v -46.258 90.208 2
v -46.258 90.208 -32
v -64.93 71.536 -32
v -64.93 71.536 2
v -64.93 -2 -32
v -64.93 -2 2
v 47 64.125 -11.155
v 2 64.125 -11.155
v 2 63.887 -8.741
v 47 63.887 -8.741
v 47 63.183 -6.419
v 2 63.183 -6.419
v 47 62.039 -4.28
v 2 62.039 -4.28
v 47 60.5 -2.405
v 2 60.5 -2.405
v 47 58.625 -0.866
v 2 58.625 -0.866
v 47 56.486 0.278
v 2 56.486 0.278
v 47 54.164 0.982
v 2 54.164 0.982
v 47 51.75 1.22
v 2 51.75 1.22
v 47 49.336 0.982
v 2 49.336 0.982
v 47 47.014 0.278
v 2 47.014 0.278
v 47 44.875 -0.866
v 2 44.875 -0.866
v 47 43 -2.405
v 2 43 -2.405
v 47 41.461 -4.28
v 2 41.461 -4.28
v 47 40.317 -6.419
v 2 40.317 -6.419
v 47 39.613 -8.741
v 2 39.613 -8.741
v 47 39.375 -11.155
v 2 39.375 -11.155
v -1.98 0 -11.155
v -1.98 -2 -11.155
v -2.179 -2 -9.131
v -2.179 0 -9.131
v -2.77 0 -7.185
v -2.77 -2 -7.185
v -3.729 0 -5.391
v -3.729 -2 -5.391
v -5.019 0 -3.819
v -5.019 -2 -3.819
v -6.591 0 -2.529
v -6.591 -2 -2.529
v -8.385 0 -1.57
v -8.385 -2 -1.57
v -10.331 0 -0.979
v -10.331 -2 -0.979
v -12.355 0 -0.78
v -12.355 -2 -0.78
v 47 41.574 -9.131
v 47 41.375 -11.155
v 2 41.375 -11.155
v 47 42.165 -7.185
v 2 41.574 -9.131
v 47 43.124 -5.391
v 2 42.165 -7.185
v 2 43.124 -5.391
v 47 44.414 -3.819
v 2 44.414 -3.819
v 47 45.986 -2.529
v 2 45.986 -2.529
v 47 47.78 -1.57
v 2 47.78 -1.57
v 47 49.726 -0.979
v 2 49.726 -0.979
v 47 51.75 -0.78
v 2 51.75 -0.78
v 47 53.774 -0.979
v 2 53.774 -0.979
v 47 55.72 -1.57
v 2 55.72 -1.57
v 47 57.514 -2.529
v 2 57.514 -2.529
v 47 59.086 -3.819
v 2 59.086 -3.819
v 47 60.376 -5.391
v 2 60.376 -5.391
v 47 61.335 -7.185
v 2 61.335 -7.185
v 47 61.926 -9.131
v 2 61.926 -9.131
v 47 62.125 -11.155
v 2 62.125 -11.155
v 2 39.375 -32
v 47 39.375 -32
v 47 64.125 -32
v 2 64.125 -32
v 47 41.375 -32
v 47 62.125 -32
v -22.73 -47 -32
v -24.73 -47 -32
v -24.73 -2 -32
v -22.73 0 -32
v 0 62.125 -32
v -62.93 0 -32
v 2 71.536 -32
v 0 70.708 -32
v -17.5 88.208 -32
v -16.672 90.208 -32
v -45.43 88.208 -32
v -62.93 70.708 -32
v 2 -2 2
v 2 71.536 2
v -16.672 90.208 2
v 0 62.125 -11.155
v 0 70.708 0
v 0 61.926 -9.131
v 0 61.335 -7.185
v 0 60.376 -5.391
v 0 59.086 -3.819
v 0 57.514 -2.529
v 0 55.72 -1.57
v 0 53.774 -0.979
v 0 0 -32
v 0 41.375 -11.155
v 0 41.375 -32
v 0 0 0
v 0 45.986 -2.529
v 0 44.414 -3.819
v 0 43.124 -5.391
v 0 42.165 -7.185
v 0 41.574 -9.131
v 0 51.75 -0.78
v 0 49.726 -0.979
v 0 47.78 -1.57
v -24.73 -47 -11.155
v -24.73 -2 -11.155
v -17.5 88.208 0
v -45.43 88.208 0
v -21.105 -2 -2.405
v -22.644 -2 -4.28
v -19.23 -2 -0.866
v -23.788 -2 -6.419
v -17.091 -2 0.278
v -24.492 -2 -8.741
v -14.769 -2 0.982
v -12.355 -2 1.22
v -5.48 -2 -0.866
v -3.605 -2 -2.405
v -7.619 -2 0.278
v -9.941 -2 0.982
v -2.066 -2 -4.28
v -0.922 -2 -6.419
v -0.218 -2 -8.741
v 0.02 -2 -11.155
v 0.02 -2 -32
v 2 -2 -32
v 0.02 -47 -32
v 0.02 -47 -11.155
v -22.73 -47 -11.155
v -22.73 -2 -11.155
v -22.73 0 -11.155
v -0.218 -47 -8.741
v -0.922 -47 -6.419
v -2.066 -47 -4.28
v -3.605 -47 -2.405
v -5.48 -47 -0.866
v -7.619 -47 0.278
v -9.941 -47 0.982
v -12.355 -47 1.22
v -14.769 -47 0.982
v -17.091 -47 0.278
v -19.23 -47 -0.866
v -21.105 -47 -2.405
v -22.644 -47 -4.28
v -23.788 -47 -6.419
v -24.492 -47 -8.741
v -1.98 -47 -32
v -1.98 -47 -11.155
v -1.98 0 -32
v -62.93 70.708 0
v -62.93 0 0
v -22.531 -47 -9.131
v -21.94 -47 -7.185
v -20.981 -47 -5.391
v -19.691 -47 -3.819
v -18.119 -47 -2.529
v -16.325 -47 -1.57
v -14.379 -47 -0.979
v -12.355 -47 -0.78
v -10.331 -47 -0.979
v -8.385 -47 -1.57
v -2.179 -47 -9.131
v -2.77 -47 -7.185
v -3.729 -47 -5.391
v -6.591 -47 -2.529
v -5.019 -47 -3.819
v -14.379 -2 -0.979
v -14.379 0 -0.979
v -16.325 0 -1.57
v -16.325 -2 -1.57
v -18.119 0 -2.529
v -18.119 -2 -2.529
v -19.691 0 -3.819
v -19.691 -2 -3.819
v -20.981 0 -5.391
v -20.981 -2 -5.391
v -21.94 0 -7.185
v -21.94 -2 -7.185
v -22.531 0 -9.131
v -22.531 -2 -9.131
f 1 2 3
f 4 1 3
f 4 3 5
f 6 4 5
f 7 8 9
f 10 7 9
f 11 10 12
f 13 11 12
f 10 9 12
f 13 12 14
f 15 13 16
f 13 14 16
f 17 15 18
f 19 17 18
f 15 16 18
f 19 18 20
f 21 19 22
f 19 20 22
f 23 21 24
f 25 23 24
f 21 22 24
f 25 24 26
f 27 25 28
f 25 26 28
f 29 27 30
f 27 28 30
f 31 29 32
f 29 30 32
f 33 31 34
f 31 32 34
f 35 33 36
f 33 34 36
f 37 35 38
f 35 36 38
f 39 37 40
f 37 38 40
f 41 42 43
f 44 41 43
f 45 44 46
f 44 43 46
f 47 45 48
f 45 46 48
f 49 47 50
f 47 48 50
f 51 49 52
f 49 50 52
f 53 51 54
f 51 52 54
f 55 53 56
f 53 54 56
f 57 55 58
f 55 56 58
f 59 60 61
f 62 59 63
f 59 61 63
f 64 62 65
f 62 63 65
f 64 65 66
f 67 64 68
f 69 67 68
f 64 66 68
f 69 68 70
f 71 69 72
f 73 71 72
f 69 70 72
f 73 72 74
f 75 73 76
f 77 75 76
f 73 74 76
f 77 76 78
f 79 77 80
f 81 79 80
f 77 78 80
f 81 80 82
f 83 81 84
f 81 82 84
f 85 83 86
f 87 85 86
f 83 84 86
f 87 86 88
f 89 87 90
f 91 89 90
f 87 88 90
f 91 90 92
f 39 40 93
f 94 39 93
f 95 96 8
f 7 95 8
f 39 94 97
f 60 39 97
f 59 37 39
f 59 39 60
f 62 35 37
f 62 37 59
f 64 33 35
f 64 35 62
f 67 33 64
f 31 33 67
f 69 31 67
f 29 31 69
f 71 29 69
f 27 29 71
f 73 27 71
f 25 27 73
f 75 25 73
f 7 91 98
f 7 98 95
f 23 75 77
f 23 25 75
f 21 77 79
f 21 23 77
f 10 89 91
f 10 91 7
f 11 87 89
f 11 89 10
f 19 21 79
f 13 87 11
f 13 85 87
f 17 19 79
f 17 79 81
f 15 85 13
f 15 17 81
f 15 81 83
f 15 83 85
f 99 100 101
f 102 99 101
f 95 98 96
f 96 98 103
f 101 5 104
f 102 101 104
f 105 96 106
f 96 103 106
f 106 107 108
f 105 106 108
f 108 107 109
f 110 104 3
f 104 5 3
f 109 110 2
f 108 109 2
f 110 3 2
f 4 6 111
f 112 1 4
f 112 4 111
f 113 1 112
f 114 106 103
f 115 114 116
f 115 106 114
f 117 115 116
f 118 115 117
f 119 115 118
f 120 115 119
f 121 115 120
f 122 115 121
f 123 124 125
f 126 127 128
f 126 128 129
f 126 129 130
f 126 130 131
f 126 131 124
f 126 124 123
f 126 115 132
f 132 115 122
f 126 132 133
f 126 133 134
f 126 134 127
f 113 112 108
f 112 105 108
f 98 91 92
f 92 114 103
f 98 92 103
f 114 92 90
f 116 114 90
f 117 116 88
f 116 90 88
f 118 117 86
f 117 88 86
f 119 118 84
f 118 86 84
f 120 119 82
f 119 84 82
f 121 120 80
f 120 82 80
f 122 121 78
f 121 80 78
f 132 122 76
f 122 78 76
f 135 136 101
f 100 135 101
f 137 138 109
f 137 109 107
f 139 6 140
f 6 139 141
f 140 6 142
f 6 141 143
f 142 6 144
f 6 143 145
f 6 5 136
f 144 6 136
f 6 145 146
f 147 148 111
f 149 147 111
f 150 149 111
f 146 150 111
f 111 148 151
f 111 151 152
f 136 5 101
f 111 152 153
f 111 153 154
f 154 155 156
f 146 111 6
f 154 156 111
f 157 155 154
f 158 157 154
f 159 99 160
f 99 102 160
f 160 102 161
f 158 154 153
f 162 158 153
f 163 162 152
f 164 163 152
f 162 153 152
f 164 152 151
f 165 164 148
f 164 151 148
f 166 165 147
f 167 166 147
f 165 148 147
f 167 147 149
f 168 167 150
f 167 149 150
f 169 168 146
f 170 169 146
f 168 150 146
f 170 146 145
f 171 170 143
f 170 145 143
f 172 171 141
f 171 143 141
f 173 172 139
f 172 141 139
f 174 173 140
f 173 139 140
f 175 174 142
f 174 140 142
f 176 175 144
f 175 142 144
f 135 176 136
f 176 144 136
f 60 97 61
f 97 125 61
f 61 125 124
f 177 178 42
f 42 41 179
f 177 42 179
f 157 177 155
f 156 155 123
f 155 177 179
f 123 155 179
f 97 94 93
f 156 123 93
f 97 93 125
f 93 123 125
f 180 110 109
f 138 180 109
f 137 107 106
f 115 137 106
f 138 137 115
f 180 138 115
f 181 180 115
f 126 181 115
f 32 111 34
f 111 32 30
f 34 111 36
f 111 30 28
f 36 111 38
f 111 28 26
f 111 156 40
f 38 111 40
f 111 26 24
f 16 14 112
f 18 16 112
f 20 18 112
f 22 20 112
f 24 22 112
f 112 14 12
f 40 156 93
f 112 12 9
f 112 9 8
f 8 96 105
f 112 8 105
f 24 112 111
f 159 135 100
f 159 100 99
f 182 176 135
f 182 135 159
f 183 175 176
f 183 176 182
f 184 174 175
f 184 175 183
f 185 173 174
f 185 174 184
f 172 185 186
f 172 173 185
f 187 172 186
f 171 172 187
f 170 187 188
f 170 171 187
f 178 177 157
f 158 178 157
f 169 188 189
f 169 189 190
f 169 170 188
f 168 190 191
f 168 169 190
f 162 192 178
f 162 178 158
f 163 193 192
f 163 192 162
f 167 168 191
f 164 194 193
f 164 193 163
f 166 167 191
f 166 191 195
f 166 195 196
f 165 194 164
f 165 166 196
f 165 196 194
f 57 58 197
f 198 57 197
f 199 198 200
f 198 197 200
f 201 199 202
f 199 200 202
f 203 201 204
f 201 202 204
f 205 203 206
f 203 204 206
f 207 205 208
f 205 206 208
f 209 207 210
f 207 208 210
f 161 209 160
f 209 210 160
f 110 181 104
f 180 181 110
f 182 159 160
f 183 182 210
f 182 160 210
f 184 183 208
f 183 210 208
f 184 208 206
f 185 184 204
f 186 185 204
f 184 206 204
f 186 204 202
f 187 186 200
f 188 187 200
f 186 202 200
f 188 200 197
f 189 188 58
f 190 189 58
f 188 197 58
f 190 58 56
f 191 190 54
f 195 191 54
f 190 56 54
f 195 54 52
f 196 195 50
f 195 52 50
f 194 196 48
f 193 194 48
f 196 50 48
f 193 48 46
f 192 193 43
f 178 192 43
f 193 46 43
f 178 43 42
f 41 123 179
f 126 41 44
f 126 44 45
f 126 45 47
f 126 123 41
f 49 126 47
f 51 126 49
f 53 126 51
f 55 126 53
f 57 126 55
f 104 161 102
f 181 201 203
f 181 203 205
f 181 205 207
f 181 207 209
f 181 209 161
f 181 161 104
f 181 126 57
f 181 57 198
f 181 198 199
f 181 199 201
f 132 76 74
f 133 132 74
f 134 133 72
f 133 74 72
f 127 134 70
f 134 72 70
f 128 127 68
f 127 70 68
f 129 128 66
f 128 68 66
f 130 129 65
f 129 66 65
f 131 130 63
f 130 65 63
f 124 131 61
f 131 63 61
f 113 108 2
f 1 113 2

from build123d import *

# Parameters (mm, degrees)
F1_DEPTH  = 32
F3_DEPTH  = 2
F5_DEPTH  = 2
F7_DEPTH  = 2
F9_DEPTH  = 45
F11_DEPTH = 45


with BuildPart() as f1:
    # F0 (on Top) → F1 (new body)
    with BuildSketch(Plane.XY):
        Polygon((2, 71.536247), (-16.671573, 90.20782), (-46.258427, 90.20782), (-64.93, 71.536247), (-64.93, -2), (2, -2), align=None)
        Polygon((0, 70.70782), (0, 0), (-62.93, 0), (-62.93, 70.70782), (-45.43, 88.20782), (-17.5, 88.20782), align=None, mode=Mode.SUBTRACT)
    extrude(amount=-F1_DEPTH)

    # F2 (on face) → F3 (join)
    with BuildSketch(Plane.XY):
        Polygon((-64.93, 71.536247), (-64.93, -2), (2, -2), (2, 71.536247), (-16.671573, 90.20782), (-46.258427, 90.20782), align=None)
    extrude(amount=F3_DEPTH)

    # F4 (on face) → F5 (cut)
    with BuildSketch(Plane.XZ.offset(2)):
        with BuildLine():
            ThreePointArc((-12.355, -0.78), (-19.691233, -3.818767), (-22.73, -11.155))
            Line((-22.73, -11.155), (-22.73, -32))
            Line((-22.73, -32), (-1.98, -32))
            Line((-1.98, -32), (-1.98, -11.155))
            ThreePointArc((-1.98, -11.155), (-5.018767, -3.818767), (-12.355, -0.78))
        make_face()
    extrude(amount=-F5_DEPTH, mode=Mode.SUBTRACT)

    # F6 (on face) → F7 (cut)
    with BuildSketch(Plane.YZ.offset(2)):
        with BuildLine():
            Line((62.125, -32), (62.125, -11.155))
            ThreePointArc((62.125, -11.155), (59.086233, -3.818767), (51.75, -0.78))
            ThreePointArc((51.75, -0.78), (44.413767, -3.818767), (41.375, -11.155))
            Line((41.375, -11.155), (41.375, -32))
            Line((41.375, -32), (62.125, -32))
        make_face()
    extrude(amount=-F7_DEPTH, mode=Mode.SUBTRACT)

    # F8 (on face) → F9 (join)
    with BuildSketch(Plane.XZ.offset(2)):
        with BuildLine():
            ThreePointArc((0.02, -11.155), (-12.355, 1.22), (-24.73, -11.155))
            Line((-24.73, -11.155), (-24.73, -32))
            Line((-24.73, -32), (-22.73, -32))
            Line((-22.73, -32), (-22.73, -11.155))
            ThreePointArc((-22.73, -11.155), (-12.355, -0.78), (-1.98, -11.155))
            Line((-1.98, -11.155), (-1.98, -32))
            Line((-1.98, -32), (0.02, -32))
            Line((0.02, -32), (0.02, -11.155))
        make_face()
    extrude(amount=F9_DEPTH)

    # F10 (on face) → F11 (join)
    with BuildSketch(Plane.YZ.offset(2)):
        with BuildLine():
            ThreePointArc((64.125, -11.155), (51.75, 1.22), (39.375, -11.155))
            Line((39.375, -11.155), (39.375, -32))
            Line((39.375, -32), (41.375, -32))
            Line((41.375, -32), (41.375, -11.155))
            ThreePointArc((41.375, -11.155), (51.75, -0.78), (62.125, -11.155))
            Line((62.125, -11.155), (62.125, -32))
            Line((62.125, -32), (64.125, -32))
            Line((64.125, -32), (64.125, -11.155))
        make_face()
    extrude(amount=F11_DEPTH)


solid = f1.part
